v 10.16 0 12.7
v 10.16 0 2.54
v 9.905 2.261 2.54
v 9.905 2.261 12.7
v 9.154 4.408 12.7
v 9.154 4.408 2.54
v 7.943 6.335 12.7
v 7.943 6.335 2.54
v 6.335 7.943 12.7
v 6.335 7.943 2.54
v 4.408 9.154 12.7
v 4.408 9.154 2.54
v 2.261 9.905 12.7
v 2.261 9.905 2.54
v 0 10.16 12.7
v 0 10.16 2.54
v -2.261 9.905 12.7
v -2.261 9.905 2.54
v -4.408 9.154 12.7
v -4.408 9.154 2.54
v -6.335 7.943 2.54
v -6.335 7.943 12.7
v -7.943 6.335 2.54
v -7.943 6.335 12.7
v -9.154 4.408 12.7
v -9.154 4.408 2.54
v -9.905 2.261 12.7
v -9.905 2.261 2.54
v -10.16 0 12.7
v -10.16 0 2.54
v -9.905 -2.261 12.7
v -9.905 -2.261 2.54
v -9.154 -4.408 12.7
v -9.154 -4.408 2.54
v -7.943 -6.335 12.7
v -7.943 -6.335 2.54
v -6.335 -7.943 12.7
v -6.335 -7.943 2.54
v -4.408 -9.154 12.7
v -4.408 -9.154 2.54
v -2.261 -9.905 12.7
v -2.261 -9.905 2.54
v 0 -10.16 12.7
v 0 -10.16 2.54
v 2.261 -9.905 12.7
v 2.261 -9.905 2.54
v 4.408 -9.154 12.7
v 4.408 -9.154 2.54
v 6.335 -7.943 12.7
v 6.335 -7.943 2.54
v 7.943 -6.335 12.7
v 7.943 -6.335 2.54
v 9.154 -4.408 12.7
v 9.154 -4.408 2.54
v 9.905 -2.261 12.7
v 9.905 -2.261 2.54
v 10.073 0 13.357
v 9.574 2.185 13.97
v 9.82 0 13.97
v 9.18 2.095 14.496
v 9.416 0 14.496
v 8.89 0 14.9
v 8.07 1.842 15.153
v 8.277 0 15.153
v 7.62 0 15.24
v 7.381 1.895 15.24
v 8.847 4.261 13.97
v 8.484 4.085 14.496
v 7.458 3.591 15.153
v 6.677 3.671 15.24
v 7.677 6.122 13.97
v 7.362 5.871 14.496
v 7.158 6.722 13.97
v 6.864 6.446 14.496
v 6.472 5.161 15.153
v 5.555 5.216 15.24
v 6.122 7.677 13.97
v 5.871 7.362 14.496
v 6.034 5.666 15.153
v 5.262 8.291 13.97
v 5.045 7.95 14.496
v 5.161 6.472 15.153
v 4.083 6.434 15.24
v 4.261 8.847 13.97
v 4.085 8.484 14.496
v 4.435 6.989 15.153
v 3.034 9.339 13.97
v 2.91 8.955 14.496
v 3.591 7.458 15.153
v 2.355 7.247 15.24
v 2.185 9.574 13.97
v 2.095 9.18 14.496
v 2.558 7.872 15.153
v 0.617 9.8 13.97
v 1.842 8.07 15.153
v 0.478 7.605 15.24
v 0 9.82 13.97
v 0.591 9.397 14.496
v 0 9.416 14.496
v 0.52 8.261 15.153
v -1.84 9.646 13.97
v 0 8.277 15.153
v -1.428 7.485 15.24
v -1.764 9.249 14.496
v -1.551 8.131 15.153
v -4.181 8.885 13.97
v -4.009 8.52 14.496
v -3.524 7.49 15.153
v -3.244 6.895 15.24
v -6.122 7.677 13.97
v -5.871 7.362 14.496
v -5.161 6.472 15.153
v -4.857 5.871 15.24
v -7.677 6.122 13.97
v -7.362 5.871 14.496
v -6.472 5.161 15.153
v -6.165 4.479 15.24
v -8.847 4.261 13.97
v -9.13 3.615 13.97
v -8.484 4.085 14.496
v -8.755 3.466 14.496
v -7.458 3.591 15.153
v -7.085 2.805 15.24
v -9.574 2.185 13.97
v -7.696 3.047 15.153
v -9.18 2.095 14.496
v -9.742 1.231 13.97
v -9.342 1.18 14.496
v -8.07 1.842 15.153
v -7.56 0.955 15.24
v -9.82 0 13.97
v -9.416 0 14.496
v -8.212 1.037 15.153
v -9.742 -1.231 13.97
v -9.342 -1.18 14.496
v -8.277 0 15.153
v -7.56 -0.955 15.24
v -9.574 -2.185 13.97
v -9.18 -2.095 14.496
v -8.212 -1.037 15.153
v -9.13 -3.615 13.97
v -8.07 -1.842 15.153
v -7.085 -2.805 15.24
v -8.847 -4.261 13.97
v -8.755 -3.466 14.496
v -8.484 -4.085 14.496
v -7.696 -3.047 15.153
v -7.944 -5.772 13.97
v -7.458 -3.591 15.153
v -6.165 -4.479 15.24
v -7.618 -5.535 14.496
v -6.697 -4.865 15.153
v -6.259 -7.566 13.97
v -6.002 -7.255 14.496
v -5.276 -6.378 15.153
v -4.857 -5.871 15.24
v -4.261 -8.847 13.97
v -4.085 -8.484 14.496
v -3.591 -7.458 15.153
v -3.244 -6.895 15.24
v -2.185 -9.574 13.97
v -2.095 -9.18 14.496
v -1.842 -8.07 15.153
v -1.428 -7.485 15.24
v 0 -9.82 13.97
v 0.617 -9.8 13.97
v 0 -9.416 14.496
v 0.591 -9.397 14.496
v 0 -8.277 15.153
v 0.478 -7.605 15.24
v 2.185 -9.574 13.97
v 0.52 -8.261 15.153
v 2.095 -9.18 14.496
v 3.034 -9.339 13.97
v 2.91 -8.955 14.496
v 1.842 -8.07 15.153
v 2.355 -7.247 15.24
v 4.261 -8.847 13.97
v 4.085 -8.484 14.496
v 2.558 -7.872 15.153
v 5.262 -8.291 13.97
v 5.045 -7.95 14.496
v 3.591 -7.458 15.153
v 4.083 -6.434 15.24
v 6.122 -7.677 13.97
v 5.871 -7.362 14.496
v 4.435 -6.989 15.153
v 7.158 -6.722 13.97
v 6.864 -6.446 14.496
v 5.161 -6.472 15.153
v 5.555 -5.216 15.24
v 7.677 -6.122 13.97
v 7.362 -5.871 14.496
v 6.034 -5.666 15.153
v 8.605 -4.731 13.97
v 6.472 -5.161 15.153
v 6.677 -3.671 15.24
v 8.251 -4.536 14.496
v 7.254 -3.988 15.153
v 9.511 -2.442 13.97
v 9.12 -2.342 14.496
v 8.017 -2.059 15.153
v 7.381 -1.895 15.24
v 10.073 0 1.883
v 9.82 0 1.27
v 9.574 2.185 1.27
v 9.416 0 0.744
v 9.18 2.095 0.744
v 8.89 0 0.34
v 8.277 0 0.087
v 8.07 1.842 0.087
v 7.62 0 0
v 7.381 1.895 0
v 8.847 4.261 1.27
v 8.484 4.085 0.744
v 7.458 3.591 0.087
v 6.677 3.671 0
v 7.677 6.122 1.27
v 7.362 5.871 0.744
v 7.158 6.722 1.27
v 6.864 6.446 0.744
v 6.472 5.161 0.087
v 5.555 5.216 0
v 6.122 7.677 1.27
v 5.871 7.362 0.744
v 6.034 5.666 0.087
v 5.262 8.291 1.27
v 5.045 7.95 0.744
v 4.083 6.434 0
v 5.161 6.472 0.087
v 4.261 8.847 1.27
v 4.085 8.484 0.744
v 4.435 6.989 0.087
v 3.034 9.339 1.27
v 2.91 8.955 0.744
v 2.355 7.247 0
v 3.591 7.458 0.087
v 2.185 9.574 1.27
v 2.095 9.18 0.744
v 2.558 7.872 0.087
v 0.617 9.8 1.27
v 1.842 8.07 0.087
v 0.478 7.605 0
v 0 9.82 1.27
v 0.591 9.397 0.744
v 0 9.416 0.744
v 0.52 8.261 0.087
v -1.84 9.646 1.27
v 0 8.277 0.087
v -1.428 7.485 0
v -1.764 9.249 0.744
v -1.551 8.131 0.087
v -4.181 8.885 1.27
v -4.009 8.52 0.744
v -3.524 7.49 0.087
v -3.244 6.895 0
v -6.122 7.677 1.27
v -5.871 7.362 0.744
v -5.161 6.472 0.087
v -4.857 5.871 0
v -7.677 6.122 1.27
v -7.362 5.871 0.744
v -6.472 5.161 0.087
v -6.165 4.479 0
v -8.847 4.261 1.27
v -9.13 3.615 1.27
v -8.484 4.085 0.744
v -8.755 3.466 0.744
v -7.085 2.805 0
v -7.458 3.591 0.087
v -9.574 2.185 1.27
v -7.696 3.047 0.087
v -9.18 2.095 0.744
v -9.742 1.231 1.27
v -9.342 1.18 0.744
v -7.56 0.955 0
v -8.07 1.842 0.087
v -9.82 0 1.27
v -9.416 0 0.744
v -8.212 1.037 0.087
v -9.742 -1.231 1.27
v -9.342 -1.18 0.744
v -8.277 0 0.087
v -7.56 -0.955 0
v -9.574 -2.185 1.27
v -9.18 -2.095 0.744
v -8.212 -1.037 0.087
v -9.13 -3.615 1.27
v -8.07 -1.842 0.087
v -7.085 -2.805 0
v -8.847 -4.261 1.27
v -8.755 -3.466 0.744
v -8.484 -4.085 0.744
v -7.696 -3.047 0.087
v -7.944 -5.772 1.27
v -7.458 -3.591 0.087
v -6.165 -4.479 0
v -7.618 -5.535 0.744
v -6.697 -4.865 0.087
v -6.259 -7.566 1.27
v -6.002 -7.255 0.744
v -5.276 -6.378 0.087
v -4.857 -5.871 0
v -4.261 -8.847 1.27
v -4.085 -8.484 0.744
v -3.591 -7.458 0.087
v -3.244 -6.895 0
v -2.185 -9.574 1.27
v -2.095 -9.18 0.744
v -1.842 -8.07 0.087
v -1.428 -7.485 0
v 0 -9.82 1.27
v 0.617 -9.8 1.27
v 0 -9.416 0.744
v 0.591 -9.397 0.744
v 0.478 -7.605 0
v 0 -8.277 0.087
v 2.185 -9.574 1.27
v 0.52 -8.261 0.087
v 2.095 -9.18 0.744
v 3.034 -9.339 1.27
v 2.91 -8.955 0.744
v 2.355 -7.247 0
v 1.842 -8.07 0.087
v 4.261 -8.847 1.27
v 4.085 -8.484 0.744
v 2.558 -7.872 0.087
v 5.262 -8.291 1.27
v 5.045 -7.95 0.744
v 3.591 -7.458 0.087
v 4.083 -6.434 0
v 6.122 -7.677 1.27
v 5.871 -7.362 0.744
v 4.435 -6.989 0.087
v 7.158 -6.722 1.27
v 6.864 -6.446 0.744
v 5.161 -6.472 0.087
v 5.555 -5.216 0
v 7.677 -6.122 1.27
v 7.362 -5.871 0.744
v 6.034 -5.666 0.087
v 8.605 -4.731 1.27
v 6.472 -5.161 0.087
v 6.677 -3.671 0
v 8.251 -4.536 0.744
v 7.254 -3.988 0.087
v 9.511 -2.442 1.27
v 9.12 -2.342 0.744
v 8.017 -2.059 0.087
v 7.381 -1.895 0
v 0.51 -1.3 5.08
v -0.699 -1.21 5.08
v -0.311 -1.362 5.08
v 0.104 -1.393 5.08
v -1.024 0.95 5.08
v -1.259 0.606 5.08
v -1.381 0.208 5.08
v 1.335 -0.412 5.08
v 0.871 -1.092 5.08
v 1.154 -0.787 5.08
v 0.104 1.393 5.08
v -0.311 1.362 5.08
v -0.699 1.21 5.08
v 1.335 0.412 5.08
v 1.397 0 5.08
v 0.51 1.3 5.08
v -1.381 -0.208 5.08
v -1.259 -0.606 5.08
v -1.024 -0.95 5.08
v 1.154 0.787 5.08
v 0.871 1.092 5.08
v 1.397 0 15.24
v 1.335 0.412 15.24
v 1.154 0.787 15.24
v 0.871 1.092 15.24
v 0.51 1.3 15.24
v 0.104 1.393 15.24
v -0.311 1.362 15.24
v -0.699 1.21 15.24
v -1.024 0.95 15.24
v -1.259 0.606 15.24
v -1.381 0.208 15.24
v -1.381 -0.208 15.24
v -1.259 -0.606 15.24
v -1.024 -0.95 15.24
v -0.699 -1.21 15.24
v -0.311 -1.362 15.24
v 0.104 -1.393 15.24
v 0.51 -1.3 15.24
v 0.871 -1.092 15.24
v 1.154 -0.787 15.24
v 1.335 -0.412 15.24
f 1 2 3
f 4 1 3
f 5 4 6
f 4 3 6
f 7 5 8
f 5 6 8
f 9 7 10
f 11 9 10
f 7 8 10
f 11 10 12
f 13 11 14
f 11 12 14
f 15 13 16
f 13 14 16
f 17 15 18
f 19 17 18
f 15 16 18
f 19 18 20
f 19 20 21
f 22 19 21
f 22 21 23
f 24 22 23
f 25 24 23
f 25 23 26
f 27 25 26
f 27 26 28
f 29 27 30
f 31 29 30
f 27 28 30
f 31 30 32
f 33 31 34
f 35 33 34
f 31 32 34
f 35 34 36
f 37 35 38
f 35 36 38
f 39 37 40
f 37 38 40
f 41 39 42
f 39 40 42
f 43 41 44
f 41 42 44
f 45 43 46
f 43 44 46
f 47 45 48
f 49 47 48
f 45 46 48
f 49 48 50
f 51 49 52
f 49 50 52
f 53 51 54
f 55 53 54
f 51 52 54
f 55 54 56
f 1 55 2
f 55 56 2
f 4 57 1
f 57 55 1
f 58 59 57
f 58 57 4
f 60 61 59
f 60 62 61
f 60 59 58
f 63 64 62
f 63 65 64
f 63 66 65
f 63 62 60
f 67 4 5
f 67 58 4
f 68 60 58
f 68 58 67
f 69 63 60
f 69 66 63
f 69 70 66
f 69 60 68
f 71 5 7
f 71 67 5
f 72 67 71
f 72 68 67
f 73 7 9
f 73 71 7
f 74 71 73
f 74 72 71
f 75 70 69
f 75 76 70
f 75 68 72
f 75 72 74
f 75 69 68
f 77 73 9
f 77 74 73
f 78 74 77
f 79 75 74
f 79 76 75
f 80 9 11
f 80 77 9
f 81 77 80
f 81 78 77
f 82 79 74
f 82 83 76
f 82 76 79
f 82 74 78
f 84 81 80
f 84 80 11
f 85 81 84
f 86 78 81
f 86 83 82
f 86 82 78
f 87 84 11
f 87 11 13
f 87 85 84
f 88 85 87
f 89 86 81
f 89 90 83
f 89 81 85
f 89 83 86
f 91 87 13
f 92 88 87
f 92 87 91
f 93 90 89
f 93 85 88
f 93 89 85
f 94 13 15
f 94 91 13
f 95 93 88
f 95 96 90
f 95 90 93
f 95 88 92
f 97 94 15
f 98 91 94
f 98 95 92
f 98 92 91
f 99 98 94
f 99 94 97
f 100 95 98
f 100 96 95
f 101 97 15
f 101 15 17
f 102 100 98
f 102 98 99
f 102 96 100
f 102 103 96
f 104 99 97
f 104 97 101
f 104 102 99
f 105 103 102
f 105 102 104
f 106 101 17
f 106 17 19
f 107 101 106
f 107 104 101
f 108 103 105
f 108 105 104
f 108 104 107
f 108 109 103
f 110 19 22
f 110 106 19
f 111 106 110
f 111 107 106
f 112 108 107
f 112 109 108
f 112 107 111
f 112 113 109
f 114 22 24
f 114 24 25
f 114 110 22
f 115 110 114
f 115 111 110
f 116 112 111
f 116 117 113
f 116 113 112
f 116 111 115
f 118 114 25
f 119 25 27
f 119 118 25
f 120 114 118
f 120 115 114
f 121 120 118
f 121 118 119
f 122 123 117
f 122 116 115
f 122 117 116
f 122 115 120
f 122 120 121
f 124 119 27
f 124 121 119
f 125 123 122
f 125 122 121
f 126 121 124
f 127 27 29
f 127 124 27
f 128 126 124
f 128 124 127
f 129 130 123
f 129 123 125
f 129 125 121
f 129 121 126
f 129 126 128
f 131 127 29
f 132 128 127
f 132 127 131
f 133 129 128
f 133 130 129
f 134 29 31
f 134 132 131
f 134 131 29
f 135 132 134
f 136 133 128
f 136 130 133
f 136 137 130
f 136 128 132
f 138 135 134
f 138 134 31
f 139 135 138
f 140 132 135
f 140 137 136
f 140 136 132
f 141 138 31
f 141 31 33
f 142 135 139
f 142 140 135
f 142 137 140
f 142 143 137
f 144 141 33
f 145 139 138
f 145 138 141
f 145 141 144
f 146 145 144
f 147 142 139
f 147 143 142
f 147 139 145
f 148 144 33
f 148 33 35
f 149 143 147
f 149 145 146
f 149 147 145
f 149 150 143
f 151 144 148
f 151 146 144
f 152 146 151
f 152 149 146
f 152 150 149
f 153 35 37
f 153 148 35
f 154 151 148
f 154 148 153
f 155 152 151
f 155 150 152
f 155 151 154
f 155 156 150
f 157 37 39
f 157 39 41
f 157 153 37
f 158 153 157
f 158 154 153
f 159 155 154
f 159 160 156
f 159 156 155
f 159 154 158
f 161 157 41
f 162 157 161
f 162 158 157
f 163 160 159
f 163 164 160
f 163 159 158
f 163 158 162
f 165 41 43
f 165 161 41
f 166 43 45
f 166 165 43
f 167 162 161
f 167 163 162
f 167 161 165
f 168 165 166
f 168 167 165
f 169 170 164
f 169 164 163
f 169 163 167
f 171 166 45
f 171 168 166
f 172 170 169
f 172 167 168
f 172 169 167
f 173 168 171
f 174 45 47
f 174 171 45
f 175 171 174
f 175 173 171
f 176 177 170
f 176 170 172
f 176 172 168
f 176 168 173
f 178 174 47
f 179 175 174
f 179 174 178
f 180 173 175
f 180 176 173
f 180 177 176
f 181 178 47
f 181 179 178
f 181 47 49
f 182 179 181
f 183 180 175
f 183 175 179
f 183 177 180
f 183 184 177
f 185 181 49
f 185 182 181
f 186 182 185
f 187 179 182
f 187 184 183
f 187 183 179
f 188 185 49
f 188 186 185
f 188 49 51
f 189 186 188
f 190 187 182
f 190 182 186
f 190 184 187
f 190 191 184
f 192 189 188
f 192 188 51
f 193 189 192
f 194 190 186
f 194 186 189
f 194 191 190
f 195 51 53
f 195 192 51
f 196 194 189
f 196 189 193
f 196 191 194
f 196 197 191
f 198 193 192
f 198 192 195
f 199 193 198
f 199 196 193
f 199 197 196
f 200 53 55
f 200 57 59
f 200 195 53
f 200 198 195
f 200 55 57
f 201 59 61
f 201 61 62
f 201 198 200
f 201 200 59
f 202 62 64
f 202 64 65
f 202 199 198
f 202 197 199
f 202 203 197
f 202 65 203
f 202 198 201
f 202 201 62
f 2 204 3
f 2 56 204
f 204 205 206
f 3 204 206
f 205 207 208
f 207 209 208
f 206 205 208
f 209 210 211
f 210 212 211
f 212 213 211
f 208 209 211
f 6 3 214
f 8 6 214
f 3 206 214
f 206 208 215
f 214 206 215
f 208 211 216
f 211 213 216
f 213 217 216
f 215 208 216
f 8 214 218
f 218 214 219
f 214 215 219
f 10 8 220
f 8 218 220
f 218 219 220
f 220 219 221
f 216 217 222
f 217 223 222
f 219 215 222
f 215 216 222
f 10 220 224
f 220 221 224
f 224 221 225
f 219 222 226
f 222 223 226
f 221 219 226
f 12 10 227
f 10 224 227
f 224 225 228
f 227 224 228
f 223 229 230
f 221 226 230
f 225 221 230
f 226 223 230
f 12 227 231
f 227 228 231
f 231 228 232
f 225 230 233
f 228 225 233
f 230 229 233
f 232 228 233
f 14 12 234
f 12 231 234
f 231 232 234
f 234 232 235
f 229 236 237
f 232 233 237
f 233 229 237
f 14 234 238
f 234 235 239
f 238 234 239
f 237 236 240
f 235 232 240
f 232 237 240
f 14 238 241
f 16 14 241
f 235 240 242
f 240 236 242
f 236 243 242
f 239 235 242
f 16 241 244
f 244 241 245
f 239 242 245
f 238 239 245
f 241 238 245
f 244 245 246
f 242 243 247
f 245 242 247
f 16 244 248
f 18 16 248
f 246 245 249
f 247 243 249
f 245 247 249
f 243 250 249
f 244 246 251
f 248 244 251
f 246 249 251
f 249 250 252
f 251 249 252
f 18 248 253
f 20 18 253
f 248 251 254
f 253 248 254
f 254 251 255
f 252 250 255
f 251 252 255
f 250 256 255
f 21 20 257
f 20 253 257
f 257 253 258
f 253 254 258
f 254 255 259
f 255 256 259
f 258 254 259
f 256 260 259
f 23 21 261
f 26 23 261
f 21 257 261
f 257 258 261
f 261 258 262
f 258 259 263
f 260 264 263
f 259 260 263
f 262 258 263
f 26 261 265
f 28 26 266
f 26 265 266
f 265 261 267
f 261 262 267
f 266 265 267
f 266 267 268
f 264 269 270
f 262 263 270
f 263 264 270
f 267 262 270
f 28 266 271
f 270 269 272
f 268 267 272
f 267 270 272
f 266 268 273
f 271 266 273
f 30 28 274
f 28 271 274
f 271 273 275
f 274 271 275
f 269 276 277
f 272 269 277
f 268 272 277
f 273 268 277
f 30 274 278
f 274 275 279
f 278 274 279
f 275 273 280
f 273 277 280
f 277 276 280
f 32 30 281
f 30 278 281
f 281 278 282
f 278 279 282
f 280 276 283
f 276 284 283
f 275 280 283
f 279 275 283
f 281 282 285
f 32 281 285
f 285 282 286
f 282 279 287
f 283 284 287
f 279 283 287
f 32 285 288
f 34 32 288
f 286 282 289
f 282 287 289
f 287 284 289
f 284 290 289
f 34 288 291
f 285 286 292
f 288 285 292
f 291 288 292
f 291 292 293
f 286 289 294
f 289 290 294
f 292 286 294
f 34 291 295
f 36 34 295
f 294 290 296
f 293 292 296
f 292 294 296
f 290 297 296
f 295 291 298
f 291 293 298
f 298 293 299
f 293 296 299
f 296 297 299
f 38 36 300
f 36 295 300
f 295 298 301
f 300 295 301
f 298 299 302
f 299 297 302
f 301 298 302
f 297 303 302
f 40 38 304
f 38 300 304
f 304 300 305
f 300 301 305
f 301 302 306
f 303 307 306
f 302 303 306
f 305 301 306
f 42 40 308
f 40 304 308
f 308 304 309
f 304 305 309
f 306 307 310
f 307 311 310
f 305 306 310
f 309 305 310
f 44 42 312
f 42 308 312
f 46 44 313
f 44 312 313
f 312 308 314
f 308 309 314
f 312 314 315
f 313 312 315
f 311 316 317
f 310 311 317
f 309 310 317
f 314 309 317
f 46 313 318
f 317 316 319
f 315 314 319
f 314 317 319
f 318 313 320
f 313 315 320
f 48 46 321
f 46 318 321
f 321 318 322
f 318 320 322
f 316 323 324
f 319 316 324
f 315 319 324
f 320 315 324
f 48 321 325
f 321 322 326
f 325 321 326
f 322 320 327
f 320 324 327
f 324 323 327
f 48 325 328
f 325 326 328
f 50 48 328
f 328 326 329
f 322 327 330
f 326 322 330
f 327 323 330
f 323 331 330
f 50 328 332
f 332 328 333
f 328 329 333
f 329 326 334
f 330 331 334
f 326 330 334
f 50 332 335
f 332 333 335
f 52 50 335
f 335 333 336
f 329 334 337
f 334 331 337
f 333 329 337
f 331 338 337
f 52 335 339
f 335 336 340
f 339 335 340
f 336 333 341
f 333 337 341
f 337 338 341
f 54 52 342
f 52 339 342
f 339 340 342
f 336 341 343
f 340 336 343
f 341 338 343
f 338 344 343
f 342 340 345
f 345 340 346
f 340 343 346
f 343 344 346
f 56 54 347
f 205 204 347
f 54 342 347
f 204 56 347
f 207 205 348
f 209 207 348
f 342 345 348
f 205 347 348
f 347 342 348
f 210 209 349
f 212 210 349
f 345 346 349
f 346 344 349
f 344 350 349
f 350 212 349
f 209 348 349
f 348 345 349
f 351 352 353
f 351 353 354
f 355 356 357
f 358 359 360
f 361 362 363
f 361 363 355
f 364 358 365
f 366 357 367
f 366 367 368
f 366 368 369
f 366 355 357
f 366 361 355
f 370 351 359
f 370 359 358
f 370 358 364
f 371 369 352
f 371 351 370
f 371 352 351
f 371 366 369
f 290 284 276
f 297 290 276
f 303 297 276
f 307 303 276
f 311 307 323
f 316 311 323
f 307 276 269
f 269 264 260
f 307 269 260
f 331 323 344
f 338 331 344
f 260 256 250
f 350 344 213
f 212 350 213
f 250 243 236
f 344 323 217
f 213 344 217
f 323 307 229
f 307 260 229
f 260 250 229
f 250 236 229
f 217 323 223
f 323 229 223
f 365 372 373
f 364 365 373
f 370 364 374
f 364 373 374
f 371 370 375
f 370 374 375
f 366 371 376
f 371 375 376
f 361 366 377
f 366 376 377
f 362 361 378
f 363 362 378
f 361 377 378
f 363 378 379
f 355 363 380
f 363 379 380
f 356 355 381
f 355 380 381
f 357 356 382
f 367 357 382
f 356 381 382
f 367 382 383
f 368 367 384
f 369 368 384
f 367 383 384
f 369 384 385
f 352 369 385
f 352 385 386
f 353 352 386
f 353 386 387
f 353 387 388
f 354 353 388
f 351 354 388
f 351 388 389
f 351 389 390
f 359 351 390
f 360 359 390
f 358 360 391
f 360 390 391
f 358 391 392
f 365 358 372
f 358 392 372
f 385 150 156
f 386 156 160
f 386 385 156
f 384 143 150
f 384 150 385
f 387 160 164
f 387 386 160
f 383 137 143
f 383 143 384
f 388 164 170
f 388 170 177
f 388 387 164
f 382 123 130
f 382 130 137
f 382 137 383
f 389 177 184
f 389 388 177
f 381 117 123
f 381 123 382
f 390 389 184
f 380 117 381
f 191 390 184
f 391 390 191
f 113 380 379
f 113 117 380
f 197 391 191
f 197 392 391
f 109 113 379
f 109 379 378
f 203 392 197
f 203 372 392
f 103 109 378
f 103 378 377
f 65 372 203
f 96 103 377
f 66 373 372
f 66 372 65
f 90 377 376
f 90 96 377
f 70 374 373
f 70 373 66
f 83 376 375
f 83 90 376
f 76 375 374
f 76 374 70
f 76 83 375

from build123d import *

# Parameters (mm, degrees)
F0_R     = 10.16
F1_DEPTH = 15.24
F2_R     = 2.54
F3_R     = 1.397
F4_DEPTH = 10.16


with BuildPart() as f1:
    # F0 (on Top) → F1 (new body)
    with BuildSketch(Plane.XY):
        Circle(F0_R)
    extrude(amount=F1_DEPTH)

    # F2
    f2_edges = [f1.edges().sort_by_distance(p)[0] for p in [
        (-10.16, 0, 0),
        (-10.16, 0, 15.24),
    ]]
    fillet(f2_edges, radius=F2_R)

    # F3 (on face) → F4 (cut)
    with BuildSketch(Plane.XY.offset(15.24)):
        Circle(F3_R)
    extrude(amount=-F4_DEPTH, mode=Mode.SUBTRACT)


solid = f1.part
